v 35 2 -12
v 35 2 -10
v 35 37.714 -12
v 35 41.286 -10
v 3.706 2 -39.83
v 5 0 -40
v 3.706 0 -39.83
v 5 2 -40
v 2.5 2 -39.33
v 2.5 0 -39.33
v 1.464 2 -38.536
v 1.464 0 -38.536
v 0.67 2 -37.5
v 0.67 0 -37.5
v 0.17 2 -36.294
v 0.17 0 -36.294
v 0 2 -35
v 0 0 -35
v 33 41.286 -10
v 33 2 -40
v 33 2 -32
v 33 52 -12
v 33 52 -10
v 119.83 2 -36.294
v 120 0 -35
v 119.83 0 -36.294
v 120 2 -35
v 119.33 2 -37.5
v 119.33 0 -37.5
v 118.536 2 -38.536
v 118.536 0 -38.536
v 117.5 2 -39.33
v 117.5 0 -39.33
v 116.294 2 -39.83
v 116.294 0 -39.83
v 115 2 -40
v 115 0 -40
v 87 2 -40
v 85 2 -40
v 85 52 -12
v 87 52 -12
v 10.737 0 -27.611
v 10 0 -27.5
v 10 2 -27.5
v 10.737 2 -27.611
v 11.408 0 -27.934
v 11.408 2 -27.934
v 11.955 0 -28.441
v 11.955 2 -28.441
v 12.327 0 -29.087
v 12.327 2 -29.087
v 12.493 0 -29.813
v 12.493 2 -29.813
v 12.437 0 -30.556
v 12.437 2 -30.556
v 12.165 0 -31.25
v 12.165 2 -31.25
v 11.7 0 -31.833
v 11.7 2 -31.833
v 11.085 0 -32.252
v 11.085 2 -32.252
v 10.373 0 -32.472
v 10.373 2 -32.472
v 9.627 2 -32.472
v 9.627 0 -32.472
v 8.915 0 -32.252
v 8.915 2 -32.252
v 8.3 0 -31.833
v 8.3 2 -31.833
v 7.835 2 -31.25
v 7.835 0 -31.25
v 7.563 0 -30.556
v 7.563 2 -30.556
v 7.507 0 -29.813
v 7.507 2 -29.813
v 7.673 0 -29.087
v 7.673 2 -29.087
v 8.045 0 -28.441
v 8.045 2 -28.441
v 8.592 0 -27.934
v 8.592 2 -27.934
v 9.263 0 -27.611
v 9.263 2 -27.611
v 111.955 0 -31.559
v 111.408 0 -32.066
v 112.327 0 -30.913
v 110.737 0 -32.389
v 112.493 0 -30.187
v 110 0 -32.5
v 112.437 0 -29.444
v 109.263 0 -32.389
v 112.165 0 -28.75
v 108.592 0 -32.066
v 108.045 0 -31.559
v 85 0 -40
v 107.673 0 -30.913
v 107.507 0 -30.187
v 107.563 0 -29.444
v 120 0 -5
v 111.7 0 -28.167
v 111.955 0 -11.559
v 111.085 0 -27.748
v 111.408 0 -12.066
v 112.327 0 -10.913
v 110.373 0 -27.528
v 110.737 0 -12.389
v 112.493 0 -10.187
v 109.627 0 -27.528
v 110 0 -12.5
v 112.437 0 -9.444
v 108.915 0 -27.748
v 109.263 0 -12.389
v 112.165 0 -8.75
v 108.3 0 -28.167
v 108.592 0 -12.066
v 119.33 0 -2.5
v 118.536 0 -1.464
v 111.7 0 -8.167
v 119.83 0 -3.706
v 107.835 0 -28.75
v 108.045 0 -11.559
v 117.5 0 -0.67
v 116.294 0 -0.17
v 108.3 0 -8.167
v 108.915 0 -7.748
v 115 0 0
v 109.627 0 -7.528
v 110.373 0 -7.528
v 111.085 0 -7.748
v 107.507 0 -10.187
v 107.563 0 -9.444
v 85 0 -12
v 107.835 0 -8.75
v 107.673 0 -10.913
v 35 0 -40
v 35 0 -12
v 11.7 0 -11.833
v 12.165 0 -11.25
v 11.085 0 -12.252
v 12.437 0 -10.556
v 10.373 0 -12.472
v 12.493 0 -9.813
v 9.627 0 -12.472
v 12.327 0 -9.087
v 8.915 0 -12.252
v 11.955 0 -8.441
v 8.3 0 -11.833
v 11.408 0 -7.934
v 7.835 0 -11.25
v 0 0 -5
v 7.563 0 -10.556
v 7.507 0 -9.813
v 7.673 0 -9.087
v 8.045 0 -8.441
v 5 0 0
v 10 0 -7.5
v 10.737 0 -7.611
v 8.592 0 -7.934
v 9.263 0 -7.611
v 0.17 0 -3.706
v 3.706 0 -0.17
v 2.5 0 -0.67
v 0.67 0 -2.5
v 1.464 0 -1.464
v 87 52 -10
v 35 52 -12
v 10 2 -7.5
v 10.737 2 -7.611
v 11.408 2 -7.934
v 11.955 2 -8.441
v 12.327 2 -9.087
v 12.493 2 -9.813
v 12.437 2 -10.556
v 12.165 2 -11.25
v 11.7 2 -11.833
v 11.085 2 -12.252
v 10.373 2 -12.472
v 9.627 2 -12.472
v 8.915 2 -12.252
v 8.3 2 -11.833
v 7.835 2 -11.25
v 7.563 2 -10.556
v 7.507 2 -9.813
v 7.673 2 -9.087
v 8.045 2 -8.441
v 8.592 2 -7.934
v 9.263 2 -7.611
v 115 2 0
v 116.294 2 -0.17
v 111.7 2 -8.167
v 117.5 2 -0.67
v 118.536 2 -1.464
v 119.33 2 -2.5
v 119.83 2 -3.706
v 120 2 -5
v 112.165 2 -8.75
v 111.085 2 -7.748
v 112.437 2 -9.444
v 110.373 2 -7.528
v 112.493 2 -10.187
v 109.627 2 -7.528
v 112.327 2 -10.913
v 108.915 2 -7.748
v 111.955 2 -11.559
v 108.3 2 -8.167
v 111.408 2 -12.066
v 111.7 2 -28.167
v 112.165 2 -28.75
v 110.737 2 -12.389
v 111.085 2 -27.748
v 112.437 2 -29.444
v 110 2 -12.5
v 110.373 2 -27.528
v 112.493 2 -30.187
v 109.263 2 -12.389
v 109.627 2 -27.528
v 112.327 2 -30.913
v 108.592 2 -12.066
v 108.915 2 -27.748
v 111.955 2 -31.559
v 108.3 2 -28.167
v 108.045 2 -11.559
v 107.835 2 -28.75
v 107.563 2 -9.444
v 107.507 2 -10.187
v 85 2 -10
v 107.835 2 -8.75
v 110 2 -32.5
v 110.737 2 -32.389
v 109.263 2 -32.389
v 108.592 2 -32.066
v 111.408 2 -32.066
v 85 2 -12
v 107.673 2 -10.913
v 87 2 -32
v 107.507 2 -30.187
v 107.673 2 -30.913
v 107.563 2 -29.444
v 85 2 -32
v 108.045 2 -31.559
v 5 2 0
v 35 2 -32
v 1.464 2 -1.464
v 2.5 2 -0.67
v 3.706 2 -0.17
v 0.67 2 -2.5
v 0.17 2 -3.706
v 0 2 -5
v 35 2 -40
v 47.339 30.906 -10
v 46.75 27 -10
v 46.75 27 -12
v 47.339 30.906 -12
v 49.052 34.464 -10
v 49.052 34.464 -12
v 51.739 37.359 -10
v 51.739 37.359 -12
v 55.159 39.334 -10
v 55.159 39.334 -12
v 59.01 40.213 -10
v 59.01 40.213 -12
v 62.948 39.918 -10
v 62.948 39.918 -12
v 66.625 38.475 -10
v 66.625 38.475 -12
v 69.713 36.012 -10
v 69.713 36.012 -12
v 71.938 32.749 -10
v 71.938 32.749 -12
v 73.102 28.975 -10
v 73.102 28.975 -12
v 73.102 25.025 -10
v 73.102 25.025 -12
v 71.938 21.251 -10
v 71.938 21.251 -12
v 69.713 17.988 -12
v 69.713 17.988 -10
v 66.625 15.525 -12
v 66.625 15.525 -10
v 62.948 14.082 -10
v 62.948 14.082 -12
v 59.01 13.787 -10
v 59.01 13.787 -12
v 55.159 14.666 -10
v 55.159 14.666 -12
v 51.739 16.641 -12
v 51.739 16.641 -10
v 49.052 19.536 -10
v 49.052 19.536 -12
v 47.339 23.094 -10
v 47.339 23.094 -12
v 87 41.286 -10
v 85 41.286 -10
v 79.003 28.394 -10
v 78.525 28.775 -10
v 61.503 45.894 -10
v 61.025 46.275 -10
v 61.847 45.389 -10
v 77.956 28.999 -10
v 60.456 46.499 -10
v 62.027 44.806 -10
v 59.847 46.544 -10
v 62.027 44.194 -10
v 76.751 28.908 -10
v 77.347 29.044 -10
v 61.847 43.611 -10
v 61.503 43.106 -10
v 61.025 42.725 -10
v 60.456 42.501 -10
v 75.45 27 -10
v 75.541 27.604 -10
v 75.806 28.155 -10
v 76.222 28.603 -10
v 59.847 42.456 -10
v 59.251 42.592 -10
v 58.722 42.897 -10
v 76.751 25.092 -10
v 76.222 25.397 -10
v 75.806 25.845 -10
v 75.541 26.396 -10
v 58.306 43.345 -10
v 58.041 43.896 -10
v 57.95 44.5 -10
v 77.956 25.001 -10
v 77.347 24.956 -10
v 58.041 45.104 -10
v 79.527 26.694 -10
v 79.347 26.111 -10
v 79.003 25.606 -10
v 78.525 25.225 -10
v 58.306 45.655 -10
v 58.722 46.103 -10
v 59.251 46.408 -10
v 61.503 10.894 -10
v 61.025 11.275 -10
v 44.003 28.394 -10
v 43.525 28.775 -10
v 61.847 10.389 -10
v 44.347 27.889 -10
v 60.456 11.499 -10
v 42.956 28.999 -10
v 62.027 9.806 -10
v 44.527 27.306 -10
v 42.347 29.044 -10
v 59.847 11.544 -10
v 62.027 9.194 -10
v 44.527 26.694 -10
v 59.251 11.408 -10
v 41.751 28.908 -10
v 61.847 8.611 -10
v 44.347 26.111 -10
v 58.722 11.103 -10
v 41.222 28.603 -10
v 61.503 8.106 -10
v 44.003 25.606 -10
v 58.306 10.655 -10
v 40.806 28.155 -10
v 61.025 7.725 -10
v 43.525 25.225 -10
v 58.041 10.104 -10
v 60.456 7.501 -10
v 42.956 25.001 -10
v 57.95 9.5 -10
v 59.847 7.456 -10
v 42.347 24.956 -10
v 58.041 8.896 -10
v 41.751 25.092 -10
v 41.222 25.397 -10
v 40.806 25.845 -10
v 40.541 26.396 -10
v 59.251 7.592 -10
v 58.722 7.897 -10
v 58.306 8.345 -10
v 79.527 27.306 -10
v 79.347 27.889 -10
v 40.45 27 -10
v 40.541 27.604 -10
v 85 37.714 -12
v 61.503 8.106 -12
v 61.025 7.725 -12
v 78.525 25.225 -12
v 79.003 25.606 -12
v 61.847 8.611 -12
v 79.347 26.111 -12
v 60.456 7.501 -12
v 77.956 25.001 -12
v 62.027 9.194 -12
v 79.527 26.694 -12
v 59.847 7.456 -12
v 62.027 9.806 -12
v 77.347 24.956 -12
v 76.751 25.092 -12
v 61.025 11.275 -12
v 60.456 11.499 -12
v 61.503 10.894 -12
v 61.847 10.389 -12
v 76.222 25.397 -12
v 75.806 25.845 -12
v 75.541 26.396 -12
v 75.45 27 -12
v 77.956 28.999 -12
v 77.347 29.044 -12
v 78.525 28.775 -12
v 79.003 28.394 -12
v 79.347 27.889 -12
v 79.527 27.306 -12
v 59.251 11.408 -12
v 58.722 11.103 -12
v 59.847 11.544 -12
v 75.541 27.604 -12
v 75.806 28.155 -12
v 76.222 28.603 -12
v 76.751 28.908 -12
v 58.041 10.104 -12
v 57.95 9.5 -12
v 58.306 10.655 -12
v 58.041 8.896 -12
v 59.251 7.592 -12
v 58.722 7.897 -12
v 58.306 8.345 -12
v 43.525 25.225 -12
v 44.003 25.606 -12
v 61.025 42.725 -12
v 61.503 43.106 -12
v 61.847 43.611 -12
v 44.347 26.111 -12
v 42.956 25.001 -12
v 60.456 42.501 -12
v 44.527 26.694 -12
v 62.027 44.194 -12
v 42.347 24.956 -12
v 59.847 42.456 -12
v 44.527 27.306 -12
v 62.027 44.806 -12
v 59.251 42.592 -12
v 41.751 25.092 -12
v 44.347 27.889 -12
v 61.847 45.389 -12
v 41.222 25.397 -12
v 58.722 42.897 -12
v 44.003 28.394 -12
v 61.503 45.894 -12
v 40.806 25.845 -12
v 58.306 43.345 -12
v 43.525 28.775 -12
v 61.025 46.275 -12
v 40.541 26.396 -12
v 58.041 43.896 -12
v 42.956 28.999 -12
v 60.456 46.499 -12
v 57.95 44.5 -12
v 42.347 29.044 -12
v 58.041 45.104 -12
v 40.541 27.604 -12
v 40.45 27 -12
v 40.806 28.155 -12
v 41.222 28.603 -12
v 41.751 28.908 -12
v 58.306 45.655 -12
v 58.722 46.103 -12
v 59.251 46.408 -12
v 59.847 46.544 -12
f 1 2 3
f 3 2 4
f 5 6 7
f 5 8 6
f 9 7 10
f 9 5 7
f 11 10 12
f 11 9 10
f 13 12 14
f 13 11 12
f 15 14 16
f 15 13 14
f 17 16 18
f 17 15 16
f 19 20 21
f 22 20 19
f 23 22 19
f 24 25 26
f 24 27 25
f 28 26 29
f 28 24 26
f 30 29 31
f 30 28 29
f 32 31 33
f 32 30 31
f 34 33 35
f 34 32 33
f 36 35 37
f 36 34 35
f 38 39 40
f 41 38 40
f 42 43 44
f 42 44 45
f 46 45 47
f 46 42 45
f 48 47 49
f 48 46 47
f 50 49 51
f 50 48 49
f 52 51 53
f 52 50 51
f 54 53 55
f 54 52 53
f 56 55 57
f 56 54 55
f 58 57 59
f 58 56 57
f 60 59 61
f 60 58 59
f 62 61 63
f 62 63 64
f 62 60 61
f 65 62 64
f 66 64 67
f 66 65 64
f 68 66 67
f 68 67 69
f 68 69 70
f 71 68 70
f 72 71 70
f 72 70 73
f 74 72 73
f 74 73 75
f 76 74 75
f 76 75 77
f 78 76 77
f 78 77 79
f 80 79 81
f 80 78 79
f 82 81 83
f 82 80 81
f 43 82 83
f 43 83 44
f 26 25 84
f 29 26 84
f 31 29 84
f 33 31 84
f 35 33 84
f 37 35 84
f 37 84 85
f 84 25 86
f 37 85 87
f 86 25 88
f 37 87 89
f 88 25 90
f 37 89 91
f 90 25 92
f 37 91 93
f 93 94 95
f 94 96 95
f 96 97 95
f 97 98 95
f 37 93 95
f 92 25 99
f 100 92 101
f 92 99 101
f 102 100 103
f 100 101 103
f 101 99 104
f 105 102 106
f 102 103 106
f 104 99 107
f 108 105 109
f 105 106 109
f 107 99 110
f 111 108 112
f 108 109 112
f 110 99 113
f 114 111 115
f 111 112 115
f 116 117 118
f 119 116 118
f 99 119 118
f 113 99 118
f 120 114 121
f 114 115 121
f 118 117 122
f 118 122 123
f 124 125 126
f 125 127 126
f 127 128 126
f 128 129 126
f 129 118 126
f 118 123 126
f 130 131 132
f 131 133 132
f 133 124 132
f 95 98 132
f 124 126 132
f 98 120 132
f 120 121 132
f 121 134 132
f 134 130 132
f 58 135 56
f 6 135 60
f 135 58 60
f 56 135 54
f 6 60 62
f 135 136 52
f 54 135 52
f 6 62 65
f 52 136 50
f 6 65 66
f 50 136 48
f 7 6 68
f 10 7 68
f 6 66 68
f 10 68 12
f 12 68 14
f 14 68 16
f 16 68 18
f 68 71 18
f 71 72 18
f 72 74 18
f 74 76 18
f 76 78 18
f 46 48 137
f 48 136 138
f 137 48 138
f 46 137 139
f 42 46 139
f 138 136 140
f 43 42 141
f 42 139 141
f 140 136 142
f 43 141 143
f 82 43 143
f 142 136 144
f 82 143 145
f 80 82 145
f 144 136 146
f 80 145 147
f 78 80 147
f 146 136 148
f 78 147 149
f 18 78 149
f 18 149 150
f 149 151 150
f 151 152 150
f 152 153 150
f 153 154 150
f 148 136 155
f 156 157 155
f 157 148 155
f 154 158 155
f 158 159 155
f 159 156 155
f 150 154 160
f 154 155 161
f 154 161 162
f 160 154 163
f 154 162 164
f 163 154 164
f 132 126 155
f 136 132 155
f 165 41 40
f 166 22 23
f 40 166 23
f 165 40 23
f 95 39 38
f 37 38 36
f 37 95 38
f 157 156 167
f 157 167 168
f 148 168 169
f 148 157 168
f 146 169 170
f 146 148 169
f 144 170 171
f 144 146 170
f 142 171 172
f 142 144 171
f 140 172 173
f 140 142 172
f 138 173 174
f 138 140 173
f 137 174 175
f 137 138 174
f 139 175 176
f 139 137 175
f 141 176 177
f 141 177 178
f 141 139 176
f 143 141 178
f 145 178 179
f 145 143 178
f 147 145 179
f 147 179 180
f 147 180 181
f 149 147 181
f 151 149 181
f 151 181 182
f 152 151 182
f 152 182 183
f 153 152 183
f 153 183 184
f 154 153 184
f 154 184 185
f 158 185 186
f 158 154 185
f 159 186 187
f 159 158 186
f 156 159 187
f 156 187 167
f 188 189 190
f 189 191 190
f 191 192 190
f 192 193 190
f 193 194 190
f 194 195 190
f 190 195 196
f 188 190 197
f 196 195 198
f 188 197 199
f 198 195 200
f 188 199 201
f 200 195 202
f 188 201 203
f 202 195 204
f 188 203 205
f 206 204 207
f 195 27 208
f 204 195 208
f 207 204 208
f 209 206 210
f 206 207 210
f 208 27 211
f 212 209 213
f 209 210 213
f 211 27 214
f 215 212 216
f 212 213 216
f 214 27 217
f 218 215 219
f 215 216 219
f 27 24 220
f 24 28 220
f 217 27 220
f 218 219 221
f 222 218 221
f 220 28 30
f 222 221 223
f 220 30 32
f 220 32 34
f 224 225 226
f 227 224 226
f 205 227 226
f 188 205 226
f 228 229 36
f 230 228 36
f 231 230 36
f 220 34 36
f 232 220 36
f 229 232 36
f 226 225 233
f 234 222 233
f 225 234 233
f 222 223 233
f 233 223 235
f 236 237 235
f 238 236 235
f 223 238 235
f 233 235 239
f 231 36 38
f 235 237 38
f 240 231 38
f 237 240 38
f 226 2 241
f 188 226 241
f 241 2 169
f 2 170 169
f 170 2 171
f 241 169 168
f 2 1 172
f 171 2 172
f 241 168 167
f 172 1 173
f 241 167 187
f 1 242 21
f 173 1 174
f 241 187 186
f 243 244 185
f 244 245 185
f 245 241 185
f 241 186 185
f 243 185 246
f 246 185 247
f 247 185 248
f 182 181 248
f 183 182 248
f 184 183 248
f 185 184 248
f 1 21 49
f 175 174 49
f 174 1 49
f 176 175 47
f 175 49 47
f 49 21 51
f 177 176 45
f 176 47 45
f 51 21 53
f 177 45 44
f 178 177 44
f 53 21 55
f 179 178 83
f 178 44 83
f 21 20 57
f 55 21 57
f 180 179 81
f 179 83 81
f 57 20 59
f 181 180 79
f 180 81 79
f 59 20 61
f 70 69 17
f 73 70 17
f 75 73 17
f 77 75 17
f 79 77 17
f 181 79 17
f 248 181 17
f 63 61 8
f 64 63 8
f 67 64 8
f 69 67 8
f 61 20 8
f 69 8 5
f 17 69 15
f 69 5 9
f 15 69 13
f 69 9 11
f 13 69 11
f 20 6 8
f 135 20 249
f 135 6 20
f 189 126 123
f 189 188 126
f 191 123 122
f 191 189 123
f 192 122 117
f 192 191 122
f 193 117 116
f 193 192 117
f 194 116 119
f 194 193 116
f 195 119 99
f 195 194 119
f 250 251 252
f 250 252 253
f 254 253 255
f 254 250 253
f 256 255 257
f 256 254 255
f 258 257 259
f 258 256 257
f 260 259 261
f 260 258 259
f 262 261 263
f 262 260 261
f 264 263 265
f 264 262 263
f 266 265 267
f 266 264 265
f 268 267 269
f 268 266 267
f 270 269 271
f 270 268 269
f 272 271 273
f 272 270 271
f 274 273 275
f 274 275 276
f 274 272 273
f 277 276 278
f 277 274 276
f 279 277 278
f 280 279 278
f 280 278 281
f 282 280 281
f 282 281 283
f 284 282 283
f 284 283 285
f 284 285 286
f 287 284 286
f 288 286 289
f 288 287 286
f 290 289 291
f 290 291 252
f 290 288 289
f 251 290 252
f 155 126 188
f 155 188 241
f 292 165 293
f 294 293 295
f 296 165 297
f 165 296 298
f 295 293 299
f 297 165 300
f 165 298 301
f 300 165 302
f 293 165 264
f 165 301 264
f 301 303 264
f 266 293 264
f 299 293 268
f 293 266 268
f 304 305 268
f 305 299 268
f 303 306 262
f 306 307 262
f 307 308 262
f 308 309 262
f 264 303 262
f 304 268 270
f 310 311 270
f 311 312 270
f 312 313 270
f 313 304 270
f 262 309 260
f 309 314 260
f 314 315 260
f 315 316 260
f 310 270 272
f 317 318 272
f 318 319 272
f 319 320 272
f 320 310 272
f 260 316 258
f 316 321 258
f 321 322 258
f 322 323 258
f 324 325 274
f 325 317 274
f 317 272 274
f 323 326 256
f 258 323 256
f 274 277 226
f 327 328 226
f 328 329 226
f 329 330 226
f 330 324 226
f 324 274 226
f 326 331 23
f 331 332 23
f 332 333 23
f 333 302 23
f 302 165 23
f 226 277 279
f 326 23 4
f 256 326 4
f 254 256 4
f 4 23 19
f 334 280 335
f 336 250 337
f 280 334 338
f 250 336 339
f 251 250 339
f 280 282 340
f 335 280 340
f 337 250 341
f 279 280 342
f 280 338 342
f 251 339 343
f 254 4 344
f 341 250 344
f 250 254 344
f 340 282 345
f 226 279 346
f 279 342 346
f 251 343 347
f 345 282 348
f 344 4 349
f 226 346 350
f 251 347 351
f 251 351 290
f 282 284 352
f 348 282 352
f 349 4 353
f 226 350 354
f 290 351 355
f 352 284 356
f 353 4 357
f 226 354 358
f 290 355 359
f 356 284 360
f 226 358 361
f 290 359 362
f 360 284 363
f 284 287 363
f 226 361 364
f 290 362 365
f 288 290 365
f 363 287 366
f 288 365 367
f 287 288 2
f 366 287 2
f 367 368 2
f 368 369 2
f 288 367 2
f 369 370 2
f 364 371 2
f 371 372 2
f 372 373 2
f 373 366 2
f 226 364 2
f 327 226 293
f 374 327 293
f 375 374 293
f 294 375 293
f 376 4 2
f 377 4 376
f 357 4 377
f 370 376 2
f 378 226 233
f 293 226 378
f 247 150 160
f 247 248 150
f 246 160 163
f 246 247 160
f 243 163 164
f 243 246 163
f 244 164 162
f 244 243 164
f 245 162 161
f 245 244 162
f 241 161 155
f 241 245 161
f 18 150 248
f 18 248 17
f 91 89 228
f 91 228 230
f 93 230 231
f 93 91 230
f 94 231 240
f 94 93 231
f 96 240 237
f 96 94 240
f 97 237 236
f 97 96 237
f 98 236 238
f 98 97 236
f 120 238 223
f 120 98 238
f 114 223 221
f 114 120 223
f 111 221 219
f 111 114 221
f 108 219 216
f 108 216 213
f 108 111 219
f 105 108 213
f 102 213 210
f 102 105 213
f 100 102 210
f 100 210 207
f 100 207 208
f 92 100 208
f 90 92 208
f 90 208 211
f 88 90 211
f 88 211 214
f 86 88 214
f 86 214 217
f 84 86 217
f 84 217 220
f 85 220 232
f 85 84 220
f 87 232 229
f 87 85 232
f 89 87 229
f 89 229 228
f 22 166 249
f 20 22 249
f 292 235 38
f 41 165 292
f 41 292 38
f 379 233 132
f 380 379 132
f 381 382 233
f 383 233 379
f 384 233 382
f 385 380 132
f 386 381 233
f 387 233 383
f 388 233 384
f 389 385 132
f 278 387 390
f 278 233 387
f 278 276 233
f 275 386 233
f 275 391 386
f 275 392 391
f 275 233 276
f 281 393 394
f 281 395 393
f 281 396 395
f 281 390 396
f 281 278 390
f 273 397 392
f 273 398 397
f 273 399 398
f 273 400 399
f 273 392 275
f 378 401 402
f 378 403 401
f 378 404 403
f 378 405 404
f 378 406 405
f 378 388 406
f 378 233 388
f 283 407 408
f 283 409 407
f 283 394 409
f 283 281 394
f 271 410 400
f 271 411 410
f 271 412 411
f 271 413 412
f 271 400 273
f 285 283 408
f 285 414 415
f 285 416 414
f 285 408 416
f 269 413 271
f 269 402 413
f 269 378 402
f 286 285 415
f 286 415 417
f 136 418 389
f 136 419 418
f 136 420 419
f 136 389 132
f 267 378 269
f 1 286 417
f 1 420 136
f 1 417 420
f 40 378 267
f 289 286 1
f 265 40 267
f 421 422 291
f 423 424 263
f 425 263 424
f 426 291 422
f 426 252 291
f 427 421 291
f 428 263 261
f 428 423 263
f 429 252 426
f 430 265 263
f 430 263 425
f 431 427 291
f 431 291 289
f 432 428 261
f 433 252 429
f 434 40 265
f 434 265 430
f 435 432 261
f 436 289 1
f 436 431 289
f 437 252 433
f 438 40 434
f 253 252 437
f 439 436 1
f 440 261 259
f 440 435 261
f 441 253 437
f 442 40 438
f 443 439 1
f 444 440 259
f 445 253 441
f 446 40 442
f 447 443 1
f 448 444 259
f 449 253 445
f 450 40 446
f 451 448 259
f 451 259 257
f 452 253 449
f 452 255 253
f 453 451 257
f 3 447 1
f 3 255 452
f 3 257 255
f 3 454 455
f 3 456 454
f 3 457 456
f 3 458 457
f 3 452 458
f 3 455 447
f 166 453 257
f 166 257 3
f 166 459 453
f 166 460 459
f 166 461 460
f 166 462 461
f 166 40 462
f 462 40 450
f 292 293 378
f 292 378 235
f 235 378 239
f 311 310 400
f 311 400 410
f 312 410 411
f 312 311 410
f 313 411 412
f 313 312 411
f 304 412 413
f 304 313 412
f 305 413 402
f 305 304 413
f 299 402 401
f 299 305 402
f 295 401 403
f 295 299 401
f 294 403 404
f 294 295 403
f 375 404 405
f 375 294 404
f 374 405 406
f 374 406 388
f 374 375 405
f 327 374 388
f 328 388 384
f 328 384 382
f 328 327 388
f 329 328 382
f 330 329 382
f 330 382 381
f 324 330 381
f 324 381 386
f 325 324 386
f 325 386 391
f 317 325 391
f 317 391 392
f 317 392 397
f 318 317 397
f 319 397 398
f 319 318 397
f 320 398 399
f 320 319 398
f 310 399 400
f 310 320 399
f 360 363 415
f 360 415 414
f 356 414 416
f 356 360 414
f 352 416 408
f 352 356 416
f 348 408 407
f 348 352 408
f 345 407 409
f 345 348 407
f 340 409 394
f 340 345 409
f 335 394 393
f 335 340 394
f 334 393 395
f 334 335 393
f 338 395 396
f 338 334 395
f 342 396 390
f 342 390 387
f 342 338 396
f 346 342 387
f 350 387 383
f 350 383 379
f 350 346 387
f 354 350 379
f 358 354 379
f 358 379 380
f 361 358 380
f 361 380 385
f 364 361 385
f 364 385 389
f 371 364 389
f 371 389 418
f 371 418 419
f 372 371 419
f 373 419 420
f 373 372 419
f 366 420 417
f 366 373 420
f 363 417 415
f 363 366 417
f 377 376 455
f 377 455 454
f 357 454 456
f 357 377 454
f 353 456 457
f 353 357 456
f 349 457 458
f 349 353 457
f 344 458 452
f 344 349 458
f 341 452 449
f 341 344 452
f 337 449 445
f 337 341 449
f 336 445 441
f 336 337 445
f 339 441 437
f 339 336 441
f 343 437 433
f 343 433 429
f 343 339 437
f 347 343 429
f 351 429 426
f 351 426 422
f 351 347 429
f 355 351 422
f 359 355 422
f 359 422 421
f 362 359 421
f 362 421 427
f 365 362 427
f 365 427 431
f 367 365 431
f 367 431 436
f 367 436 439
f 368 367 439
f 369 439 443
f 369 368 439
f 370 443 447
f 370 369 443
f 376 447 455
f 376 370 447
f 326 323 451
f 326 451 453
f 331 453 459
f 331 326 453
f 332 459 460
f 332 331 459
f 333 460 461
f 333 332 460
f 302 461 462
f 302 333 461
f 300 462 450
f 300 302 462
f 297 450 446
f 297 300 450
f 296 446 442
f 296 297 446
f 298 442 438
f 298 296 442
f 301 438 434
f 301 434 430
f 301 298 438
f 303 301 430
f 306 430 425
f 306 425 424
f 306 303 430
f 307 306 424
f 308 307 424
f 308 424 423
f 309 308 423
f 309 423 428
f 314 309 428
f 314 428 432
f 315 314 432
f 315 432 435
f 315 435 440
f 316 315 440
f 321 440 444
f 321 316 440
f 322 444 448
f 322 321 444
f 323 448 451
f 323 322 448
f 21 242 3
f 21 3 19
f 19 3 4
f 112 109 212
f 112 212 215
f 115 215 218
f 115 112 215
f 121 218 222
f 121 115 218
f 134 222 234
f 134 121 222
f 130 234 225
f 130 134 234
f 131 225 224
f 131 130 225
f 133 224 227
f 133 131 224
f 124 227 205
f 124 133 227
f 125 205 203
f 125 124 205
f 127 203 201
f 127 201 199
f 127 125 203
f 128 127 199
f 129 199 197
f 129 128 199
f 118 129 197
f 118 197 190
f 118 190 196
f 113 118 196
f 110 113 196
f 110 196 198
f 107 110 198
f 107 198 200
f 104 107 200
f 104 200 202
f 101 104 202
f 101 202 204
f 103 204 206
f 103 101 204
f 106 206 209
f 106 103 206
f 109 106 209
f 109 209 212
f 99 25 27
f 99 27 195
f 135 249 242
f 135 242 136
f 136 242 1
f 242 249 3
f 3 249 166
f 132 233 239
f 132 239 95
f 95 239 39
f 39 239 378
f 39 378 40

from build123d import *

# Parameters (mm, degrees)
SKETCH1_R           = 2.5
BOSS_EXTRUDE1_DEPTH = 2
SKETCH2_W           = 50
SKETCH2_H           = 52
SKETCH2_R           = 13.25
SKETCH2_R_2         = 2.05
BOSS_EXTRUDE2_DEPTH = 2
BOSS_EXTRUDE3_DEPTH = 2
BOSS_EXTRUDE4_DEPTH = 2
FILLET1_R           = 5


with BuildPart() as part:
    # Sketch1 → Boss-Extrude1 (new body)
    with BuildSketch(Plane(origin=(0, 0, 0), x_dir=(1, 0, 0), z_dir=(0, 1, 0))):
        Polygon((35, 40), (35, 10), (85, 10), (85, 40), (120, 40), (120, 0), (0, 0), (0, 40), align=None)
        with Locations(Location((10, 30, 0), (0, 0, 270))):
            Circle(SKETCH1_R, mode=Mode.SUBTRACT)
        with Locations(Location((10, 10, 0), (0, 0, 270))):
            Circle(SKETCH1_R, mode=Mode.SUBTRACT)
        with Locations(Location((110, 10, 0), (0, 0, 90))):
            Circle(SKETCH1_R, mode=Mode.SUBTRACT)
        with Locations(Location((110, 30, 0), (0, 0, 90))):
            Circle(SKETCH1_R, mode=Mode.SUBTRACT)
    extrude(amount=BOSS_EXTRUDE1_DEPTH)

    # Sketch2 → Boss-Extrude2 (add)
    with BuildSketch(Plane(origin=(0, 0, -10), x_dir=(-1, 0, 0), z_dir=(0, 0, -1))):
        with Locations((-60, 26)):
            Rectangle(SKETCH2_W, SKETCH2_H)
        with Locations((-60, 27)):
            Circle(SKETCH2_R, mode=Mode.SUBTRACT)
        with Locations((-60, 44.5)):
            Circle(SKETCH2_R_2, mode=Mode.SUBTRACT)
        with Locations((-42.5, 27)):
            Circle(SKETCH2_R_2, mode=Mode.SUBTRACT)
        with Locations((-60, 9.5)):
            Circle(SKETCH2_R_2, mode=Mode.SUBTRACT)
        with Locations((-77.5, 27)):
            Circle(SKETCH2_R_2, mode=Mode.SUBTRACT)
    extrude(amount=BOSS_EXTRUDE2_DEPTH)

    # Sketch3 → Boss-Extrude3 (add)
    with BuildSketch(Plane.ZY.offset(-35)):
        Polygon((-12, 52), (-40, 2), (-32, 2), (-10, 41.285714286), (-10, 52), align=None)
    extrude(amount=BOSS_EXTRUDE3_DEPTH)

    # Sketch4 → Boss-Extrude4 (add)
    with BuildSketch(Plane(origin=(85, 0, 0), x_dir=(0, 0, -1), z_dir=(1, 0, 0))):
        Polygon((10, 52), (10, 41.285714286), (32, 2), (40, 2), (12, 52), align=None)
    extrude(amount=BOSS_EXTRUDE4_DEPTH)

    # Fillet1
    fillet1_edges = [part.edges().sort_by_distance(p)[0] for p in [
        (0, 1, -40),
        (120, 1, -40),
        (120, 1, 0),
        (0, 1, 0),
    ]]
    fillet(fillet1_edges, radius=FILLET1_R)


solid = part.part
